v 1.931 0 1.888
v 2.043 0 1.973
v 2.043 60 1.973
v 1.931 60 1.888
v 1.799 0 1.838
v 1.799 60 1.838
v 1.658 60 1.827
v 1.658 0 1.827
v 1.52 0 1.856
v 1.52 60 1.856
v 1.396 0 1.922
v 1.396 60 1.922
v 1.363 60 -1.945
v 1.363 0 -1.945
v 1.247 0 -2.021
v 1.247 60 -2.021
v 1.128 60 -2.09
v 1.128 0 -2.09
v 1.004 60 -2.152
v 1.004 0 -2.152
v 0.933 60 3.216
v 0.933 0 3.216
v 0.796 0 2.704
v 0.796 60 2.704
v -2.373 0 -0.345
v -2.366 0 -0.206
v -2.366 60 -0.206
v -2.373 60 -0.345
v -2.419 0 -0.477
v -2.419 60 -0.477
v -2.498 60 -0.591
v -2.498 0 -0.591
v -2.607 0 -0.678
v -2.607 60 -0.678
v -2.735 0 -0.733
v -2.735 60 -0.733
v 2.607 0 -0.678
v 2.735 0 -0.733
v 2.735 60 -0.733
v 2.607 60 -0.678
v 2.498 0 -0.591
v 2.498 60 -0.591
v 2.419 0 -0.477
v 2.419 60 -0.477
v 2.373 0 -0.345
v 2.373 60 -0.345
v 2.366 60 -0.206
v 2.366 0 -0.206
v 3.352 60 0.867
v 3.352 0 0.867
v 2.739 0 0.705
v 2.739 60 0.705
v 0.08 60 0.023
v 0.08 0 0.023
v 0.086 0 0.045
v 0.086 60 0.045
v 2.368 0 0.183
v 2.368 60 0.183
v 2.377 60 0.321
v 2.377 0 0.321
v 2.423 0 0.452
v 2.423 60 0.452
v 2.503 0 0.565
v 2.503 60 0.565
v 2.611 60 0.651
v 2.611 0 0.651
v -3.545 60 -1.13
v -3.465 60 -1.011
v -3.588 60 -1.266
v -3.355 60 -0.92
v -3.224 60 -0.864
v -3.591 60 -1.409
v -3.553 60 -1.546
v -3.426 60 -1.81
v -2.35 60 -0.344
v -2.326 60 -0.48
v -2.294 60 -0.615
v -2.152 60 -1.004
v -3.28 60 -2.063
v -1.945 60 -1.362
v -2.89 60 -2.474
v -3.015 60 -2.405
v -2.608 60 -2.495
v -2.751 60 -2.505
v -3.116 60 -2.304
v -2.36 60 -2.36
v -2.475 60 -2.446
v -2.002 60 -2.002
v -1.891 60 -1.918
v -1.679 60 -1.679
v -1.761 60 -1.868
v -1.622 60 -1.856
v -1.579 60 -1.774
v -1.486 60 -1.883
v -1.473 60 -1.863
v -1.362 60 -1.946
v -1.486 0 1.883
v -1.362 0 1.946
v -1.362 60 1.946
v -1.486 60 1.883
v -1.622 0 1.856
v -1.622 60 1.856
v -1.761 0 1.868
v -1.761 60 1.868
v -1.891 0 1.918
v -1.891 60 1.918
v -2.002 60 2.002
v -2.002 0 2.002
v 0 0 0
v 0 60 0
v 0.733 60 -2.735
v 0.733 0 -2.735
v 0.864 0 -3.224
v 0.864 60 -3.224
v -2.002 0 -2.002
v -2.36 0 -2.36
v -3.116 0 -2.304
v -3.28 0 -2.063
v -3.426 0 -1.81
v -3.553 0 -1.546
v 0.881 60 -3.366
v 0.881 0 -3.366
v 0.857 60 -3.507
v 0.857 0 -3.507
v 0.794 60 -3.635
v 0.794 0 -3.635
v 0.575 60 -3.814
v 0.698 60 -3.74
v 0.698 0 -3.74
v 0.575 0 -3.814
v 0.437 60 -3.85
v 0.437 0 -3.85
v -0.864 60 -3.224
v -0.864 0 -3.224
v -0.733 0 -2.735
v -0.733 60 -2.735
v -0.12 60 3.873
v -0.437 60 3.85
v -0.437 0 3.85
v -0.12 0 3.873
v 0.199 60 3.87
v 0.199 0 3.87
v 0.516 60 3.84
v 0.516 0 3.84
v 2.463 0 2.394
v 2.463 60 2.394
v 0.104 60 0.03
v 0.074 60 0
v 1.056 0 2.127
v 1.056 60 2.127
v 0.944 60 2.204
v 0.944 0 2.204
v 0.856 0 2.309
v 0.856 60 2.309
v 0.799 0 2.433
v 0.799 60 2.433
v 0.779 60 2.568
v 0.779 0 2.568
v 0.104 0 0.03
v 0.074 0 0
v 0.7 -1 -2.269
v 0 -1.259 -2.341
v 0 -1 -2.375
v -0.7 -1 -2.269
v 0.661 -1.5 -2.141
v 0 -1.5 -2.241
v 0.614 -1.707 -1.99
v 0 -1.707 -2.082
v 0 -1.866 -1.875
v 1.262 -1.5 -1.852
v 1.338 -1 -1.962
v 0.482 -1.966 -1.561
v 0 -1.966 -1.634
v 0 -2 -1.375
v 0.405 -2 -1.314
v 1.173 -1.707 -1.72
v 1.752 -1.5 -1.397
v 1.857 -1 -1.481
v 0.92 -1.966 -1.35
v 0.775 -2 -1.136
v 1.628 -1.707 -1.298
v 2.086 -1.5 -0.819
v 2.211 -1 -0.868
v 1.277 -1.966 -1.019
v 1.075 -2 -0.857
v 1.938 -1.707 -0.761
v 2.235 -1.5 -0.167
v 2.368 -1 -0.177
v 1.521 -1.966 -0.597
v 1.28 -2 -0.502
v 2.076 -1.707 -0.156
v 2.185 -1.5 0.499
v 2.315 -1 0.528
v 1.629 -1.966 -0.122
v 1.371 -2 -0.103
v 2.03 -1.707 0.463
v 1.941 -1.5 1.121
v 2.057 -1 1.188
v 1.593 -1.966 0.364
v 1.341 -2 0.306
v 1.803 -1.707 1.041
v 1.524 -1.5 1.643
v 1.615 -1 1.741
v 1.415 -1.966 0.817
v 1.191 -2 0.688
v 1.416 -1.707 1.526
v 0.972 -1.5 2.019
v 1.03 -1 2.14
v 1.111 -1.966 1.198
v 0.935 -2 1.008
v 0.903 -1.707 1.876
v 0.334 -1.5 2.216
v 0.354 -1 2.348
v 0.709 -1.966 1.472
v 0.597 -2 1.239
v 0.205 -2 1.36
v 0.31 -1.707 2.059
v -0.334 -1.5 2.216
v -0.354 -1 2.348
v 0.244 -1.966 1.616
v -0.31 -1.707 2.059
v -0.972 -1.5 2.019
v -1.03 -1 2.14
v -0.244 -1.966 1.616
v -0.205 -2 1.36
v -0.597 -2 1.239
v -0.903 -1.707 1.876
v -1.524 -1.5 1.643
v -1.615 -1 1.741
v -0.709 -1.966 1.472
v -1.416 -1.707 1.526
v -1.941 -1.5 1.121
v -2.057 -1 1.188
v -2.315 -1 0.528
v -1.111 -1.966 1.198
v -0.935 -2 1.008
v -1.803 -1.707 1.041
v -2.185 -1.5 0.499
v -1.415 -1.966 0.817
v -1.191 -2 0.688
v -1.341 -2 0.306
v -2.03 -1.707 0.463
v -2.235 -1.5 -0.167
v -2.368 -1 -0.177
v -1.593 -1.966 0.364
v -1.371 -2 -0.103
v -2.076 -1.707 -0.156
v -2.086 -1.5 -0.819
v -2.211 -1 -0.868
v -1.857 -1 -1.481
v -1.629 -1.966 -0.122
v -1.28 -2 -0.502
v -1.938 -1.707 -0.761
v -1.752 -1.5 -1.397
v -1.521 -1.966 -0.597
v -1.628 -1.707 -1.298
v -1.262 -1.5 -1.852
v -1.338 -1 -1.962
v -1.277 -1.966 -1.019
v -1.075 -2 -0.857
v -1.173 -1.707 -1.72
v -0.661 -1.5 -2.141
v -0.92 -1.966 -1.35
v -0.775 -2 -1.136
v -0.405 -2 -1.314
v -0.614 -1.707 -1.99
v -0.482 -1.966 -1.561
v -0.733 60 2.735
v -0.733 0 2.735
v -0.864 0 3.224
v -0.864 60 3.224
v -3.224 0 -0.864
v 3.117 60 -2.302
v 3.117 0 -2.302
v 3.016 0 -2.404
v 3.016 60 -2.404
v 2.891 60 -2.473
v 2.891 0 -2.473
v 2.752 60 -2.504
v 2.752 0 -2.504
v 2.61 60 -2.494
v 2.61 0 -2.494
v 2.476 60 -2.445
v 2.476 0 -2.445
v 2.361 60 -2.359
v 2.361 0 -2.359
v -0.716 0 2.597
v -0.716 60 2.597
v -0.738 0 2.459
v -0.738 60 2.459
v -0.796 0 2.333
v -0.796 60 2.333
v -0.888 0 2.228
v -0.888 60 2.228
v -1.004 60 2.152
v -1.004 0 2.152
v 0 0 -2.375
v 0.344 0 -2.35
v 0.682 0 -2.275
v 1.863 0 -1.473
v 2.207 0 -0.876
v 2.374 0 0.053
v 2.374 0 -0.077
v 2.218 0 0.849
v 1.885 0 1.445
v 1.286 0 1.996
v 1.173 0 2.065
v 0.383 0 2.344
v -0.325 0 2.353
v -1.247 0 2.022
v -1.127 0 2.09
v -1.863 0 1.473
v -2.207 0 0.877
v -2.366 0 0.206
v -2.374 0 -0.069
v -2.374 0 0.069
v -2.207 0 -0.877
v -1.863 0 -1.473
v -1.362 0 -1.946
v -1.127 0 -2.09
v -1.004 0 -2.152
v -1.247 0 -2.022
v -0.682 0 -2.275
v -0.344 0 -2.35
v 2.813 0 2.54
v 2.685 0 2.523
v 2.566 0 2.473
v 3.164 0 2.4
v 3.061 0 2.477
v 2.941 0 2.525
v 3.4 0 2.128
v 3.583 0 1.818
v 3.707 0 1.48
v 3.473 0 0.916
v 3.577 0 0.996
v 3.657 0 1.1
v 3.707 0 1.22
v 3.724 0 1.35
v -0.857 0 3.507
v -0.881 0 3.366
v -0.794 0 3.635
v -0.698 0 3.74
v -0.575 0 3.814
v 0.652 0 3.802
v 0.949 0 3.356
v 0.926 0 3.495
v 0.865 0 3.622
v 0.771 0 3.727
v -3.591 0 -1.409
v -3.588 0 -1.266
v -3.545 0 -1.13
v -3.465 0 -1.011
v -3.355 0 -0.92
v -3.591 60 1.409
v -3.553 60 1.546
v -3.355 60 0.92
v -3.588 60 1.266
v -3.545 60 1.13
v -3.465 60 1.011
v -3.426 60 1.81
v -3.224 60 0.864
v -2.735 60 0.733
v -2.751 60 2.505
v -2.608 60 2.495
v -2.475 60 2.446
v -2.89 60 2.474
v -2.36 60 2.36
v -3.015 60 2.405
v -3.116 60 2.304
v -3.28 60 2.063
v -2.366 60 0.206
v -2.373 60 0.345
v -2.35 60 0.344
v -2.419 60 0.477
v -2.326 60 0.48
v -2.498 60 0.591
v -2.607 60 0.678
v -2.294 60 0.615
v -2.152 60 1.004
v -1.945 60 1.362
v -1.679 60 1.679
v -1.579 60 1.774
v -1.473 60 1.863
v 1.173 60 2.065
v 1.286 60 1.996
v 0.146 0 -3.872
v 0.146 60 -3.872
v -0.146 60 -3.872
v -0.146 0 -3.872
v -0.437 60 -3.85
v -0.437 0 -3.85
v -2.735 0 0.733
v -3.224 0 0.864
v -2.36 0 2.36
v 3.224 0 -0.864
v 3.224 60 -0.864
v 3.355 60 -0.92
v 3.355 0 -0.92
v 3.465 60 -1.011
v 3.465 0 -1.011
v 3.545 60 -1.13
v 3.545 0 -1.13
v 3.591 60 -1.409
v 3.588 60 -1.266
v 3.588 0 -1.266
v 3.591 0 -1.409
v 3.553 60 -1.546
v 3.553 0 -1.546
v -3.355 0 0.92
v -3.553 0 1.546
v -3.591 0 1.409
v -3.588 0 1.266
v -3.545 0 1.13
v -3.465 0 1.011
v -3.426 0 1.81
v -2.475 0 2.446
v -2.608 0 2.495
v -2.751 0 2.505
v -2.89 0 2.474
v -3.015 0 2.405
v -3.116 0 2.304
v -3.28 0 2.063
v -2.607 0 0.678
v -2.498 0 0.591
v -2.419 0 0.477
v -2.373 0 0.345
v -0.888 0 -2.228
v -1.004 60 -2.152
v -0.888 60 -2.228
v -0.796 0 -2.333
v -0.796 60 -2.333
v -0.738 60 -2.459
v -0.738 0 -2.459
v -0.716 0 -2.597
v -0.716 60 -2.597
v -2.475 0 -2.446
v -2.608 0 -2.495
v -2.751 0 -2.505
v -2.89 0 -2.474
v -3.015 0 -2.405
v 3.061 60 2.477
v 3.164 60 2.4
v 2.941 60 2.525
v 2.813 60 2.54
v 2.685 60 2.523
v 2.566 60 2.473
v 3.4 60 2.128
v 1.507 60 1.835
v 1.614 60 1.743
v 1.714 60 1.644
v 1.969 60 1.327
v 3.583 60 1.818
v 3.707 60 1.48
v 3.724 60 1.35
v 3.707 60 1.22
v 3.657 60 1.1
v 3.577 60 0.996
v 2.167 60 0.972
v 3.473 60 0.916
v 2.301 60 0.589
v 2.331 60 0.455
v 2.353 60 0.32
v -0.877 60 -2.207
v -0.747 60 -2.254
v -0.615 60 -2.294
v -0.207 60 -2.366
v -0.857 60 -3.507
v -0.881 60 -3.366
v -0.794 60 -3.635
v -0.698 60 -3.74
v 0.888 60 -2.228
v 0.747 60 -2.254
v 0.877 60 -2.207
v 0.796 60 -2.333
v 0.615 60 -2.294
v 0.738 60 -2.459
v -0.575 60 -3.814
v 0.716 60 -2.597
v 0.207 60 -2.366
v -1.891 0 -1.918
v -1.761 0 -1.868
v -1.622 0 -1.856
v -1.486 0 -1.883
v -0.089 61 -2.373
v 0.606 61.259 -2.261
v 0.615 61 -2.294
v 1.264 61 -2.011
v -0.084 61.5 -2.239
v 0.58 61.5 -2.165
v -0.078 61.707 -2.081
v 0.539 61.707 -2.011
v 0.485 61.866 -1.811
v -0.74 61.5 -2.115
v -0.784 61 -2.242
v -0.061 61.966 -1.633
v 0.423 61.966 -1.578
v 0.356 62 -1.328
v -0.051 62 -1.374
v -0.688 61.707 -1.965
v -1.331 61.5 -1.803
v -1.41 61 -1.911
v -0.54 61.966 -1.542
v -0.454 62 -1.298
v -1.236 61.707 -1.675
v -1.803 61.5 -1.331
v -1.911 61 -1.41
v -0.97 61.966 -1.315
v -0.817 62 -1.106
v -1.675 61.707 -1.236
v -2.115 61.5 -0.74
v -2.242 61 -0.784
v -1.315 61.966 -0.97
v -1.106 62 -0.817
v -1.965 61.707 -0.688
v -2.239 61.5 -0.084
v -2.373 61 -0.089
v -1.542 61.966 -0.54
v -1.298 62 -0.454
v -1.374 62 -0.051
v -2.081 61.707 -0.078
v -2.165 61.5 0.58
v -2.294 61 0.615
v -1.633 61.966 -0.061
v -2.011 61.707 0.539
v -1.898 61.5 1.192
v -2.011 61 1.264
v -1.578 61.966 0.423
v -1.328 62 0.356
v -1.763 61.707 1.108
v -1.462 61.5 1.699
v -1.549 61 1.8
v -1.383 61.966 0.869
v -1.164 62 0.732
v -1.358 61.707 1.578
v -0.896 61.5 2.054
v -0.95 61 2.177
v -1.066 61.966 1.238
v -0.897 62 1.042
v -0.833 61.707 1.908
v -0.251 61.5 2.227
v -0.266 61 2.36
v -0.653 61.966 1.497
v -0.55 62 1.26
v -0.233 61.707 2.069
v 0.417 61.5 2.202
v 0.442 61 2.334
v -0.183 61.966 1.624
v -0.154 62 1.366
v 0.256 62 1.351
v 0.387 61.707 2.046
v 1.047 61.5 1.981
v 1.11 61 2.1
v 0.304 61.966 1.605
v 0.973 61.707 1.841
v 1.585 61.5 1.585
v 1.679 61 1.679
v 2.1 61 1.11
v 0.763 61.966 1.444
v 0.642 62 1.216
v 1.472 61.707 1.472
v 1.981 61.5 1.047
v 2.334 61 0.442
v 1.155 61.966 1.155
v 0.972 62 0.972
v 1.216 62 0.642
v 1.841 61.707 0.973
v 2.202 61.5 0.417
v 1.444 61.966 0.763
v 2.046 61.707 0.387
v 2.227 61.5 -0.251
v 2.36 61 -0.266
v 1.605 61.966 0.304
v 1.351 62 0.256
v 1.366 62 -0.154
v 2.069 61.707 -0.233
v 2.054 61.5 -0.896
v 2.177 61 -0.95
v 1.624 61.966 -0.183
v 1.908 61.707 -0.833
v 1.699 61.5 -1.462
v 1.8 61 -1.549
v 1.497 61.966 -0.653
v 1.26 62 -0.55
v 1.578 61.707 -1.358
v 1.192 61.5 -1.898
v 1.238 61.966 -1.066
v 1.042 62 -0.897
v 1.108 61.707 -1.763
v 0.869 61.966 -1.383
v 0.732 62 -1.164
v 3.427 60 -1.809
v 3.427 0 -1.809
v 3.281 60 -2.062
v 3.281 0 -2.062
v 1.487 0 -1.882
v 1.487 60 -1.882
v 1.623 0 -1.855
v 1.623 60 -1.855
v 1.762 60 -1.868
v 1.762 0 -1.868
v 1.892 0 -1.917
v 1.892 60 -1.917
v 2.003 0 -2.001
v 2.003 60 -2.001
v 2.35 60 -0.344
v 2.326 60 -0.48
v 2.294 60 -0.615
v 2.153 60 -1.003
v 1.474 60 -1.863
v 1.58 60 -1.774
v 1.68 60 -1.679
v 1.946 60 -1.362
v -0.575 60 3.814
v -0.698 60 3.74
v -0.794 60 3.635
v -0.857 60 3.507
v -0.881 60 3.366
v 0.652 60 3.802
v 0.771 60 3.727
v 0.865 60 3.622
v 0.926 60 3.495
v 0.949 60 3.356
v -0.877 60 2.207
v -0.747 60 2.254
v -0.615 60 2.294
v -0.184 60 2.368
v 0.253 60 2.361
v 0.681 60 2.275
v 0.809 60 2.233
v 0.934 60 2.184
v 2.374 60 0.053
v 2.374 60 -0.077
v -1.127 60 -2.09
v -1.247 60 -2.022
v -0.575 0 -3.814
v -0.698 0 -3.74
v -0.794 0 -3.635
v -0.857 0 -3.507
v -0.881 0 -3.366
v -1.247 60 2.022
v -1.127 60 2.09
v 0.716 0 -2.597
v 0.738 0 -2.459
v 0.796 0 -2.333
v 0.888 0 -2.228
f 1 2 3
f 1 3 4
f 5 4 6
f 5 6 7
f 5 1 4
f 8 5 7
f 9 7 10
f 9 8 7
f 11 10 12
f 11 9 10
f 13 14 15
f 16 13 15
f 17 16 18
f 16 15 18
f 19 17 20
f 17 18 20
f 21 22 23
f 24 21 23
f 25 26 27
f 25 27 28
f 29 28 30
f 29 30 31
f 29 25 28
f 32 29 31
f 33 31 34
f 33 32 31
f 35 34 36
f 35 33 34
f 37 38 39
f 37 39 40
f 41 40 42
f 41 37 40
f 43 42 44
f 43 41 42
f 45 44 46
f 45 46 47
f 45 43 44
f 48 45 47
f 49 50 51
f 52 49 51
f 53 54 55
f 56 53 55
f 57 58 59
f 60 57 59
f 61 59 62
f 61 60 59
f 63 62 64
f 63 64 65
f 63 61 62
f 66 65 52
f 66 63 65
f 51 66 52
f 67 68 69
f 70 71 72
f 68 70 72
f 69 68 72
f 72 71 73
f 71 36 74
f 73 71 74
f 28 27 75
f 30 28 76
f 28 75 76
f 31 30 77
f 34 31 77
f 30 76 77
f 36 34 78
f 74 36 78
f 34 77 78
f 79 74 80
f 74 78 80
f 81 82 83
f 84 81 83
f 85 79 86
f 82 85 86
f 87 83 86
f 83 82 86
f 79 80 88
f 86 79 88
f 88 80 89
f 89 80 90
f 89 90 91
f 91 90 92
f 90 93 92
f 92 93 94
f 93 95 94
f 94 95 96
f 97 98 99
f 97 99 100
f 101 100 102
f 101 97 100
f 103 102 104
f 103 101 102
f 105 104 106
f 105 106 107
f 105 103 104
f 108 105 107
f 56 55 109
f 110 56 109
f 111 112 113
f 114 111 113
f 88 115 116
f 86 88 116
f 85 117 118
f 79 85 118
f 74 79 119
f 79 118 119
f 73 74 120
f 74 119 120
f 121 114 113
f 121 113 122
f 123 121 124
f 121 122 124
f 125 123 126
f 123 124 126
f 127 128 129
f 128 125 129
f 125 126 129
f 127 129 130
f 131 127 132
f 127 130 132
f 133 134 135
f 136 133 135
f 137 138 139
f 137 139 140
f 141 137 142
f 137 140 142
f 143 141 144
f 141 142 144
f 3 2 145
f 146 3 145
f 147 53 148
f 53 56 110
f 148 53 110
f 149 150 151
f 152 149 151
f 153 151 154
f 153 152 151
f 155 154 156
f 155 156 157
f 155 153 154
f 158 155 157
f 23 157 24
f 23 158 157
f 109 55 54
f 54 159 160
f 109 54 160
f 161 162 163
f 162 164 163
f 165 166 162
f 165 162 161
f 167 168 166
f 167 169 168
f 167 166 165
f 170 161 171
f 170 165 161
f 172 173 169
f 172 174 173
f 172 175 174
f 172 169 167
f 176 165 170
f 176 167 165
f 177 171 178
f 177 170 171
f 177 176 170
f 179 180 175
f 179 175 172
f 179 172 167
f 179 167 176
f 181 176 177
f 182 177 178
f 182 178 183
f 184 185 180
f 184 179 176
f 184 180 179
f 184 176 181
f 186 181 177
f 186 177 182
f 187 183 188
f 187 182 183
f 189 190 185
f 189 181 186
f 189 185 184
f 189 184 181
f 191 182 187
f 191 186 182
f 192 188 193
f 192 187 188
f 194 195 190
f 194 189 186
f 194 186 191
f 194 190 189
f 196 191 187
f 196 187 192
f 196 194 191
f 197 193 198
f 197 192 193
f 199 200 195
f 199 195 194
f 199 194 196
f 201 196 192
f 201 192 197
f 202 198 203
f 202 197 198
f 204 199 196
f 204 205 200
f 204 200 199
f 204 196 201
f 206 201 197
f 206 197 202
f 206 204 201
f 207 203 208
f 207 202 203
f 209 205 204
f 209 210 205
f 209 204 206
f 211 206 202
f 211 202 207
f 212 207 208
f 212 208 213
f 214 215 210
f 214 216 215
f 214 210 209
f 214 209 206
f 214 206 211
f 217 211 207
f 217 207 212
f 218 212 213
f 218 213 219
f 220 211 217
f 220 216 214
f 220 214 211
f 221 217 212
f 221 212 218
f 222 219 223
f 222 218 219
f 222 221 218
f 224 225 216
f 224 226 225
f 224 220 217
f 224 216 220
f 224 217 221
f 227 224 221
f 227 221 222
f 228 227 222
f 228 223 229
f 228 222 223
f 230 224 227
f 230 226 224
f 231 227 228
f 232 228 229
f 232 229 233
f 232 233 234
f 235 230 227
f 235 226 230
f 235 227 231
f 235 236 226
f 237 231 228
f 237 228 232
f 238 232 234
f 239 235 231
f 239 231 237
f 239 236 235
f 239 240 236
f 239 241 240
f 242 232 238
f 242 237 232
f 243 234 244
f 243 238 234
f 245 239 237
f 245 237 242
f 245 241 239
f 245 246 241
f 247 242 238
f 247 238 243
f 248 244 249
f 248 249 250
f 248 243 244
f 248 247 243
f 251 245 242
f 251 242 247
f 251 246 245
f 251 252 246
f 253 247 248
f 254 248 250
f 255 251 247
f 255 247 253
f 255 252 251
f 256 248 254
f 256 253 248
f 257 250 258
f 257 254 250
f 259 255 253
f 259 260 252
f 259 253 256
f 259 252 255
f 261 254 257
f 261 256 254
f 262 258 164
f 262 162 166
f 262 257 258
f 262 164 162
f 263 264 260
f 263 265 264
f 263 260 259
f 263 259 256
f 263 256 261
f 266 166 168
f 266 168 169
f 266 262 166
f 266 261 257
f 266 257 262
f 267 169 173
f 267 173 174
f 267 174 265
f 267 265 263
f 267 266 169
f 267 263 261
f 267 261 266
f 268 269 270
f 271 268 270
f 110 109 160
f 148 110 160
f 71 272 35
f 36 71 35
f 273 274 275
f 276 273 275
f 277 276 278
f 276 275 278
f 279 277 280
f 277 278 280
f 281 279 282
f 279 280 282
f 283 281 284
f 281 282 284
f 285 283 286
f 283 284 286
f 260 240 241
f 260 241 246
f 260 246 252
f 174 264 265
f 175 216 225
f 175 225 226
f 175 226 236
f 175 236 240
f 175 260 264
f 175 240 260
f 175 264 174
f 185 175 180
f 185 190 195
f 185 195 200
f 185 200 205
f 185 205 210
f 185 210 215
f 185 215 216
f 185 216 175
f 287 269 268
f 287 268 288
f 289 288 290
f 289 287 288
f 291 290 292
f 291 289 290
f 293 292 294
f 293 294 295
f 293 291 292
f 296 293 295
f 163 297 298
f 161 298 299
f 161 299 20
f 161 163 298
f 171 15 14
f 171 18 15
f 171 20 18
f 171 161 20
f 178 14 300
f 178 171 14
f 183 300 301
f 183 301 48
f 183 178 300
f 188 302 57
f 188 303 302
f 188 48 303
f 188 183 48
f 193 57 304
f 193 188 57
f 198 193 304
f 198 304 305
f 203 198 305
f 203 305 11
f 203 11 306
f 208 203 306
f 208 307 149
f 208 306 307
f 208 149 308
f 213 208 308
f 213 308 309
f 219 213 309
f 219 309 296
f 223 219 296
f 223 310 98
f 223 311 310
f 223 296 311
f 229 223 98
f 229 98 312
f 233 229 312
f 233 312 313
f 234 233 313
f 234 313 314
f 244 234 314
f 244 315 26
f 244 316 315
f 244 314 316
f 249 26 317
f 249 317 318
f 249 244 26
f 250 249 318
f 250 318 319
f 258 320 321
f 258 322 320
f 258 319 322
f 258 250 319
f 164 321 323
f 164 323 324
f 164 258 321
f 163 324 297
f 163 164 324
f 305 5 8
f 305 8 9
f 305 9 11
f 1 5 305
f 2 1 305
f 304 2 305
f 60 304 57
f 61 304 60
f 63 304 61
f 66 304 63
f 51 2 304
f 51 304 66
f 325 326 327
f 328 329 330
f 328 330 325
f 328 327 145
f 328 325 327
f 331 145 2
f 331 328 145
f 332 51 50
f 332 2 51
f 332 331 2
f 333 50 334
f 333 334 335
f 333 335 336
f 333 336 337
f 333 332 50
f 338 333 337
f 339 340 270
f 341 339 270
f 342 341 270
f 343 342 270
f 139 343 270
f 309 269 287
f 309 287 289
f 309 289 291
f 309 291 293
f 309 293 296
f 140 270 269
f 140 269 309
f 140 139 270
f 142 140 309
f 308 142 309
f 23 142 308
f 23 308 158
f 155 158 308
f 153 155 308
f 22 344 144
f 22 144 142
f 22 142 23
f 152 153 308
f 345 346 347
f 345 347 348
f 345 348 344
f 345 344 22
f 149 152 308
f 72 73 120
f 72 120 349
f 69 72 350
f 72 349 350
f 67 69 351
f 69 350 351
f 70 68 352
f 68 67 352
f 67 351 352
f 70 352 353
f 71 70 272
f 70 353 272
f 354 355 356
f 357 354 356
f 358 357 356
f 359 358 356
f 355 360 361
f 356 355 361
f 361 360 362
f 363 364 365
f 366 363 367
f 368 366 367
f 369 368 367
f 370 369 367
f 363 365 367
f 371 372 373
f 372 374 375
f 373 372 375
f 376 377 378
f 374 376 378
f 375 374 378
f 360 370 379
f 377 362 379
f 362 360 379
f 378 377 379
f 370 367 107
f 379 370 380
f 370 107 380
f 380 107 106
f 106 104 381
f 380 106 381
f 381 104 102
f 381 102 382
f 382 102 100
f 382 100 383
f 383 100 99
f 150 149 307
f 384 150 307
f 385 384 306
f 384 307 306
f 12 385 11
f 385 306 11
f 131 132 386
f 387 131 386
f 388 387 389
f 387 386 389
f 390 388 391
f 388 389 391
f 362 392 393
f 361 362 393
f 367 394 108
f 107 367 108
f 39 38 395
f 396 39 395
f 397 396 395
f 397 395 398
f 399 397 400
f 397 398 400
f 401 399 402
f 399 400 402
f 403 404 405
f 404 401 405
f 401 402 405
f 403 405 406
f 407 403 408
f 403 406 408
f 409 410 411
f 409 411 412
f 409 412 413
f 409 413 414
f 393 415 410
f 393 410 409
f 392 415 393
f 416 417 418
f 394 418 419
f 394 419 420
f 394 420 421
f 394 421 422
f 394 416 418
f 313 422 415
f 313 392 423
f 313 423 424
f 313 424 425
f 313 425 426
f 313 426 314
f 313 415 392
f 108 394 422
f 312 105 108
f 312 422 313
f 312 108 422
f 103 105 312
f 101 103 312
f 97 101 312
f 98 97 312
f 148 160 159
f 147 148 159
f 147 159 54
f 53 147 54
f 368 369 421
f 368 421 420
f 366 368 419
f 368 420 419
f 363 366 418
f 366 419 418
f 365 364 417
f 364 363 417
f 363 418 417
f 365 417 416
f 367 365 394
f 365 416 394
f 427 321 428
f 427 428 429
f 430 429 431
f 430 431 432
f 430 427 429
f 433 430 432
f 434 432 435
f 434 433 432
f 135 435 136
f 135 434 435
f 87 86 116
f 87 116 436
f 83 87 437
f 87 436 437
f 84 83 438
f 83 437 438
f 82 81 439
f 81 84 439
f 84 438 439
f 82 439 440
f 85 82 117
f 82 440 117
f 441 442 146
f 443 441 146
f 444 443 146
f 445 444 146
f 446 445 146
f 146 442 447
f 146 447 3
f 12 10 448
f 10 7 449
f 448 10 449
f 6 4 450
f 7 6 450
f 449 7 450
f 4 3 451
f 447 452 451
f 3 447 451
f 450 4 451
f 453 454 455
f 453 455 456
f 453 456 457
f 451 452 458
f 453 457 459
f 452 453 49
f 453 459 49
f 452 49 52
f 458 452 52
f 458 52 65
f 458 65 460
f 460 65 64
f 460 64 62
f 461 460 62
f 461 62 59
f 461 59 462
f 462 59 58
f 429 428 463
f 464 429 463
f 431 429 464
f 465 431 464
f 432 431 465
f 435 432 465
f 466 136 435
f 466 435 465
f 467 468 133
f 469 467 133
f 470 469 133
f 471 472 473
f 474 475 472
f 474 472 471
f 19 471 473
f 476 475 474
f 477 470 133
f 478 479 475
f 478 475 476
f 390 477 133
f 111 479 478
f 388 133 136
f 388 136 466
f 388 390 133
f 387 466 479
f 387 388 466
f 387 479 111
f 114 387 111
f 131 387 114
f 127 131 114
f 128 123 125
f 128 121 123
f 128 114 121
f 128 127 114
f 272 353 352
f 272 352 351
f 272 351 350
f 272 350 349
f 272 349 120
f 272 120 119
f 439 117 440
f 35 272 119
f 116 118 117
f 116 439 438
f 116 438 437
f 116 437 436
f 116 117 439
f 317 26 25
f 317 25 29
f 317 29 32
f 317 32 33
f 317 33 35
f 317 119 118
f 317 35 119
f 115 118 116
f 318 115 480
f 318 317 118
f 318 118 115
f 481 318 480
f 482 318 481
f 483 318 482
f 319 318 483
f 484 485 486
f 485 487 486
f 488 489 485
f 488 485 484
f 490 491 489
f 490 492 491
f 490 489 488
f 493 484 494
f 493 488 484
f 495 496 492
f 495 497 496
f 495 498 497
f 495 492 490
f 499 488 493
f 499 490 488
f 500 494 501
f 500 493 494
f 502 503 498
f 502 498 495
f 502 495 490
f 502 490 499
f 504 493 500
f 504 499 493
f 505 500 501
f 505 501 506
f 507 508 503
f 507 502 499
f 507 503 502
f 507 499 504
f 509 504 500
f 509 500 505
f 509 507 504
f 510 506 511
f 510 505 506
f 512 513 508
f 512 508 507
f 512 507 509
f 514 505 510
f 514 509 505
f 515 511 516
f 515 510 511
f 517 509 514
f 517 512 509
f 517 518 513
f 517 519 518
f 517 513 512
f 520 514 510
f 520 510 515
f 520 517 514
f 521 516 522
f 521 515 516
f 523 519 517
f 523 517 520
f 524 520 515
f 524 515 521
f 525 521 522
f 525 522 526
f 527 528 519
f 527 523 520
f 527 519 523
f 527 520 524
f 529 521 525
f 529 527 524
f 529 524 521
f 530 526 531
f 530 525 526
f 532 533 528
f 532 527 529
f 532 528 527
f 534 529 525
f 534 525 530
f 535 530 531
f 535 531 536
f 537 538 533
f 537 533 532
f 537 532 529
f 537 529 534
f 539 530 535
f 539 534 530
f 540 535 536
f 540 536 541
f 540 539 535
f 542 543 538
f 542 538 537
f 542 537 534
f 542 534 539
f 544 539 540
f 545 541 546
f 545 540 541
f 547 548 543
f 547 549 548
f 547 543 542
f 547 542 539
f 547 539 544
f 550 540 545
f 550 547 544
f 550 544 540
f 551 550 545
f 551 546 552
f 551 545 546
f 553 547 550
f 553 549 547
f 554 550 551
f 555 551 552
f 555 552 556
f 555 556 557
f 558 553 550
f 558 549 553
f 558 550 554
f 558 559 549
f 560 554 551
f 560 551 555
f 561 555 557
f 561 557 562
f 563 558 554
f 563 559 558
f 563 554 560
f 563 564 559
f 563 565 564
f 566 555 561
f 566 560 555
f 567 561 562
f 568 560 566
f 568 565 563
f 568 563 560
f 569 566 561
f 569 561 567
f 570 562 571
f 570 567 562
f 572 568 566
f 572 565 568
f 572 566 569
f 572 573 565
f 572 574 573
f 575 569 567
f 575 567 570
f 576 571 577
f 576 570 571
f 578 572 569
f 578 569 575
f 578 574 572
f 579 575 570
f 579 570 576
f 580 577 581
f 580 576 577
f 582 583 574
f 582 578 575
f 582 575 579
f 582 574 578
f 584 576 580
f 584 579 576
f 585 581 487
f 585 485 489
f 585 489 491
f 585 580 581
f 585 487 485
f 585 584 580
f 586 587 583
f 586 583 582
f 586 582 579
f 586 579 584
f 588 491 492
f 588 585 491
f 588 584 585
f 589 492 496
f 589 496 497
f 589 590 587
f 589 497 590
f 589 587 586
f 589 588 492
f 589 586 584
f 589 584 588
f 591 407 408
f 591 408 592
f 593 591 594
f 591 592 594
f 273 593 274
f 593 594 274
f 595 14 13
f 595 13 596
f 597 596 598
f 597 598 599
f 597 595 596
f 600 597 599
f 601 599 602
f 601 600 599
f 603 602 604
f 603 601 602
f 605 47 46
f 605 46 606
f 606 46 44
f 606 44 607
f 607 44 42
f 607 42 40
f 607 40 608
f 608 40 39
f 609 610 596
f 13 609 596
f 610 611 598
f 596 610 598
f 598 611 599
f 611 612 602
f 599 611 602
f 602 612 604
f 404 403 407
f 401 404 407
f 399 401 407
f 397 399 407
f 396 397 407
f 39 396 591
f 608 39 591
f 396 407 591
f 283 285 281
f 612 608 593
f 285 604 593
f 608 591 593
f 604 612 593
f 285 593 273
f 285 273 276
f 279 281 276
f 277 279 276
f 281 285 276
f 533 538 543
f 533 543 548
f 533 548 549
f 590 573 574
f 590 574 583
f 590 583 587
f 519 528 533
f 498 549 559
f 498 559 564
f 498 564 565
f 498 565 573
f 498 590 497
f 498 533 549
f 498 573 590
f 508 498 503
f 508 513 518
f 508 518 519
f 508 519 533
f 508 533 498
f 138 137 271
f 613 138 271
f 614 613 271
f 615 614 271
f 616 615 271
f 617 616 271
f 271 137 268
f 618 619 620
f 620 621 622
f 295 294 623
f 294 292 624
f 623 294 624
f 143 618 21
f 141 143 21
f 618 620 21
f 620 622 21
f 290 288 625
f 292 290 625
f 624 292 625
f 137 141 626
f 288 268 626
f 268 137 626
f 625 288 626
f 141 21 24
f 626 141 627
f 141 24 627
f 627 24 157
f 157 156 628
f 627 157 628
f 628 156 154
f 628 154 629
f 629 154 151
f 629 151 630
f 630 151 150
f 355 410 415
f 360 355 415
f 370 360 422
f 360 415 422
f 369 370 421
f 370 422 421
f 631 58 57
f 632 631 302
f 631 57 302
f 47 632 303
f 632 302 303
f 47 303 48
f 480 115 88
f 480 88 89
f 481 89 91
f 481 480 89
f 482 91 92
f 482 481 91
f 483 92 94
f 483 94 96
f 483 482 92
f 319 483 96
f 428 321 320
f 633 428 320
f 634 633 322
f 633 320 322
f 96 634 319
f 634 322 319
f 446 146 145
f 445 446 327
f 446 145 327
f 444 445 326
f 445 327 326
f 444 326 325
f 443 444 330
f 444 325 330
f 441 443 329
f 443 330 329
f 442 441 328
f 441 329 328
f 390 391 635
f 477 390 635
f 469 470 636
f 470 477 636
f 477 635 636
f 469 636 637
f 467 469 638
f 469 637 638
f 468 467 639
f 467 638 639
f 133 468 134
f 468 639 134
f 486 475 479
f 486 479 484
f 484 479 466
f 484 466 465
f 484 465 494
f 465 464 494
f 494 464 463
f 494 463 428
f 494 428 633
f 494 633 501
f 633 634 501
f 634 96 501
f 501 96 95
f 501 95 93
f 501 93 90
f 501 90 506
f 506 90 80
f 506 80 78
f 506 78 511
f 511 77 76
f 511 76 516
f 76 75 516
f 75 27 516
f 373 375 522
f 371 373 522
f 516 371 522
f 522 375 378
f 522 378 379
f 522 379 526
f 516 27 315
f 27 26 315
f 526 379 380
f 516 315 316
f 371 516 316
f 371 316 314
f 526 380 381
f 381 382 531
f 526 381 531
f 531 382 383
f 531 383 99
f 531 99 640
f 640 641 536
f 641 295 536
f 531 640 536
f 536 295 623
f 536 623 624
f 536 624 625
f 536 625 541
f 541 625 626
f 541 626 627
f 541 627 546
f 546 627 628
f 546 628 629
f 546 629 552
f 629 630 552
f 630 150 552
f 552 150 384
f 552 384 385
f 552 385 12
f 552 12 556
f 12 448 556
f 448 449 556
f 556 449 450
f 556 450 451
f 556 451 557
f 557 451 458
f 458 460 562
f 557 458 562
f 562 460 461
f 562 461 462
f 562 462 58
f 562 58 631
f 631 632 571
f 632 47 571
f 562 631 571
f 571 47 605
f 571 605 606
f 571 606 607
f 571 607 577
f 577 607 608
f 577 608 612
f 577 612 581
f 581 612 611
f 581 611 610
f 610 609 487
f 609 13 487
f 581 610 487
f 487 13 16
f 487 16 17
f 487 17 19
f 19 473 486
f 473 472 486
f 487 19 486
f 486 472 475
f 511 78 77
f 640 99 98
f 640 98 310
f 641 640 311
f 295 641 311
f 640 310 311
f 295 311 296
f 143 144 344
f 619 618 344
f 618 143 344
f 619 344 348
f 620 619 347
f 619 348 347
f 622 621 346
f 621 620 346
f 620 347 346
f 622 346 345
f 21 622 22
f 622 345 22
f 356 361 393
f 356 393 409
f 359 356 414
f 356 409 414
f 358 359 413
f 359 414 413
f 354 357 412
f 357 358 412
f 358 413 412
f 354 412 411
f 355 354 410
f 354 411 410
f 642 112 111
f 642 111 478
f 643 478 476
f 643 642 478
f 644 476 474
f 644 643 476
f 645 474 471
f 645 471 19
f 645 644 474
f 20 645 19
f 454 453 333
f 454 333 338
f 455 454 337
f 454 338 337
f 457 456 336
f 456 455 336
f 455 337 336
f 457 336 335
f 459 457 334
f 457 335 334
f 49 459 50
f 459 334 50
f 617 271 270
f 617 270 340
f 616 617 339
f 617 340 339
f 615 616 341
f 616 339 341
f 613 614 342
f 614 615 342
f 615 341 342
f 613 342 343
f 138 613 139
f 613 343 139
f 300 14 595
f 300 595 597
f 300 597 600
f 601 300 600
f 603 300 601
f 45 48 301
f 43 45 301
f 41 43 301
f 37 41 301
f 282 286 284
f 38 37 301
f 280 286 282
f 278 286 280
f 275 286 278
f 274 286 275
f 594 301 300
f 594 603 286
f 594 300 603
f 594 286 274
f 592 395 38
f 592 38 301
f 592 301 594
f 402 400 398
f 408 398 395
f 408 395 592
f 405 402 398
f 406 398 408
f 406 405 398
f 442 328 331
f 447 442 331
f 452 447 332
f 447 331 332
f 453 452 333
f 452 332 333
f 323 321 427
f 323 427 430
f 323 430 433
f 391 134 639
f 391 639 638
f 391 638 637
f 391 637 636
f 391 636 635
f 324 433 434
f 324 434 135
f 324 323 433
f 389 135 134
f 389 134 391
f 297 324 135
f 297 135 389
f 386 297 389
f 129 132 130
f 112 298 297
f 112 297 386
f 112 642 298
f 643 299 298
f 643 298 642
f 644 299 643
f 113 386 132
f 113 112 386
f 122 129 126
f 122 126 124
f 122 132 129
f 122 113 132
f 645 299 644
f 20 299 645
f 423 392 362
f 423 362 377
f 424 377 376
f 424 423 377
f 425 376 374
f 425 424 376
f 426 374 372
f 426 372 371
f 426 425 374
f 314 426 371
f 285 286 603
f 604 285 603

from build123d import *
from build123d.topology import SkipClean

# Parameters (mm, degrees)
BOSS_EXTRUDE1_DEPTH = 60
SKETCH4_R           = 2.375
BOSS_EXTRUDE3_DEPTH = 2
FILLET1_R           = 0.5
BOSS_EXTRUDE5_START = 2
SKETCH6_R           = 2.375
BOSS_EXTRUDE5_DEPTH = 2
FILLET2_R           = 1


with BuildPart() as part:
    # Sketch2 → Boss-Extrude1 (new body)
    with BuildSketch(Plane(origin=(0, 0, 0), x_dir=(1, 0, 0), z_dir=(0, 1, 0))):
        with BuildLine():
            Line((3.775215965, -0.978645895), (2.300774305, -0.58912019))
            ThreePointArc((2.300774305, -0.58912019), (2.374963211, 0.013219106), (2.294073837, 0.614695232))
            Line((2.294073837, 0.614695232), (3.742962577, 1.0029238))
            ThreePointArc((3.742962577, 1.0029238), (3.356294138, 1.936727823), (2.741299364, 2.73877761))
            Line((2.741299364, 2.73877761), (1.680151223, 1.678605632))
            ThreePointArc((1.680151223, 1.678605632), (1.187973207, 2.056537055), (0.614695232, 2.294073837))
            Line((0.614695232, 2.294073837), (1.0029238, 3.742962577))
            ThreePointArc((1.0029238, 3.742962577), (0, 3.875), (-1.0029238, 3.742962577))
            Line((-1.0029238, 3.742962577), (-0.614695232, 2.294073837))
            ThreePointArc((-0.614695232, 2.294073837), (-1.1875, 2.056810334), (-1.679378605, 1.679378605))
            Line((-1.679378605, 1.679378605), (-2.740038777, 2.740038777))
            ThreePointArc((-2.740038777, 2.740038777), (-3.35584844, 1.9375), (-3.742962577, 1.0029238))
            Line((-3.742962577, 1.0029238), (-2.294073837, 0.614695232))
            ThreePointArc((-2.294073837, 0.614695232), (-2.375, 0), (-2.294073837, -0.614695232))
            Line((-2.294073837, -0.614695232), (-3.742962577, -1.0029238))
            ThreePointArc((-3.742962577, -1.0029238), (-3.35584844, -1.9375), (-2.740038777, -2.740038777))
            Line((-2.740038777, -2.740038777), (-1.679378605, -1.679378605))
            ThreePointArc((-1.679378605, -1.679378605), (-1.1875, -2.056810334), (-0.614695232, -2.294073837))
            Line((-0.614695232, -2.294073837), (-1.0029238, -3.742962577))
            ThreePointArc((-1.0029238, -3.742962577), (0.033967076, -3.874851125), (1.068386506, -3.724805401))
            Line((1.068386506, -3.724805401), (0.681359786, -2.275164575))
            ThreePointArc((0.681359786, -2.275164575), (1.238849907, -2.026296106), (1.714477211, -1.643530618))
            Line((1.714477211, -1.643530618), (2.767163136, -2.698133353))
            ThreePointArc((2.767163136, -2.698133353), (3.500652231, -1.972912562), (3.775215965, -0.978645895))
        make_face()
        Polygon((0.085836926, -0.044584082), (0, 0), (0.073933818, 0), (0.104207494, -0.030328801), (0.080162685, -0.023330742), align=None, mode=Mode.SUBTRACT)
    extrude(amount=BOSS_EXTRUDE1_DEPTH)

    # Sketch4 → Boss-Extrude3 (add)
    with BuildSketch(Plane(origin=(0, 60, 0), x_dir=(1, 0, 0), z_dir=(0, 1, 0))):
        with Locations(Location((0, 0, 0), (0, 0, 75))):
            Circle(SKETCH4_R)
    extrude(amount=BOSS_EXTRUDE3_DEPTH)

    # Fillet1
    # the kernel refuses this fillet: 0.5 mm, written as the material it adds along each edge
    with BuildSketch(Plane(origin=(-2.294073837, 0, 0.614695232), x_dir=(-0.1735157400494046, 0, -0.9848310961556339), z_dir=(0, 1, 0)), Plane(origin=(-1.679378605, 0, -1.679378605), x_dir=(0.7661308776829403, 0, -0.6426845869170722), z_dir=(0, 1, 0)), Plane(origin=(0.614695232, 0, -2.294073837), x_dir=(0.939646617732385, 0, 0.3421465092384974), z_dir=(0, 1, 0)), Plane(origin=(2.294073837, 0, -0.614695232), x_dir=(0.1735157400495284, 0, 0.9848310961556122), z_dir=(0, 1, 0)), Plane(origin=(-0.614695232, 0, 2.294073837), x_dir=(-0.9396466177323688, 0, -0.3421465092385419), z_dir=(0, 1, 0))) as fillet1_piece_1:
        with BuildLine():
            CenterArc((0.458270974, 0.498091484), FILLET1_R, 185.007705084, 79.984589832)
            Line((-0.03982051, 0.45444663), (0, 0))
            ThreePointArc((0, 0), (0.20731306, 0.00906545), (0.414626119, 0))
        make_face()
    extrude(amount=60)
    with BuildSketch(Plane(origin=(-2.294073837, 0, -0.614695232), x_dir=(-0.17351574004940104, 0, 0.9848310961556345), z_dir=(0, 1, 0)), Plane(origin=(-0.614695232, 0, -2.294073837), x_dir=(-0.9396466177323672, 0, 0.3421465092385461), z_dir=(0, 1, 0)), Plane(origin=(1.680151223, 0, -1.678605632), x_dir=(-0.7658350540129166, 0, -0.643037067395833), z_dir=(0, 1, 0))) as fillet1_piece_2:
        with BuildLine():
            CenterArc((0.458270974, -0.498091484), FILLET1_R, 95.007705084, 79.984589832)
            Line((-0.03982051, -0.45444663), (0, 0))
            ThreePointArc((0, 0), (0.20731306, -0.00906545), (0.414626119, 0))
        make_face()
    extrude(amount=60)
    with BuildSketch(Plane(origin=(2.300774305, 0, 0.58912019), x_dir=(0.9668296370387235, 0, 0.2554221073900419), z_dir=(0, 1, 0))) as fillet1_piece_3:
        with BuildLine():
            CenterArc((0.453002414, 0.5), FILLET1_R, 190.38170854, 79.61829146)
            ThreePointArc((-0.038812111, 0.409897433), (-0.010506812, 0.205791362), (0, 0))
            Line((0, 0), (0.453002414, 0))
        make_face()
    extrude(amount=60)
    with BuildSketch(Plane(origin=(1.714477211, 0, 1.643530618), x_dir=(0.7064632978713469, 0, 0.7077496794494086), z_dir=(0, 1, 0))) as fillet1_piece_4:
        with BuildLine():
            CenterArc((0.465508471, -0.5), FILLET1_R, 90, 81.041880237)
            ThreePointArc((-0.02839274, -0.422143763), (-0.00477723, -0.211705398), (0, 0))
            Line((0, 0), (0.465508471, 0))
        make_face()
    extrude(amount=60)
    with BuildSketch(Plane(origin=(0.681359786, 0, 2.275164575), x_dir=(0.25794627414893684, 0, 0.966159262053975), z_dir=(0, 1, 0))) as fillet1_piece_5:
        with BuildLine():
            CenterArc((0.443713653, 0.5), FILLET1_R, 191.464392376, 78.535607624)
            ThreePointArc((-0.046310555, 0.400620549), (-0.014636445, 0.201295026), (0, 0))
            Line((0, 0), (0.443713653, 0))
        make_face()
    extrude(amount=60)
    with BuildSketch(Plane(origin=(-1.679378605, 0, 1.679378605), x_dir=(-0.7071067811865471, 0, 0.707106781186548), z_dir=(0, 1, 0))) as fillet1_piece_6:
        with BuildLine():
            CenterArc((0.456187913, 0.5), FILLET1_R, 190.015410168, 79.984589832)
            ThreePointArc((-0.036192593, 0.413043478), (-0.00906545, 0.20731306), (0, 0))
            Line((0, 0), (0.456187913, 0))
        make_face()
    extrude(amount=60)
    # the kernel refuses this fillet: 0.5 mm, written as the material it takes off along each edge
    with BuildSketch(Plane(origin=(-2.740038777, -1.439160897, 2.740038777), x_dir=(-0.6526300069150477, 0, -0.7576767609436524), z_dir=(0, 1, 0)), Plane(origin=(-3.742962577, -1.439160897, -1.0029238), x_dir=(0.3298523193767966, 0, -0.9440325457322686), z_dir=(0, 1, 0)), Plane(origin=(2.741299364, -1.439160897, -2.73877761), x_dir=(0.652281279601926, 0, 0.7579769998363237), z_dir=(0, 1, 0))) as fillet1_2_piece_1:
        with BuildLine():
            CenterArc((0.538524723, -0.49861874), FILLET1_R, 85.740187873, 98.519624254)
            Line((0.039905983, -0.535758376), (0, 0))
            ThreePointArc((0, 0), (0.287832179, 0.010704768), (0.575664359, 0))
        make_face()
    extrude(amount=62.878321794, mode=Mode.SUBTRACT)
    with BuildSketch(Plane(origin=(-3.742962577, -1.439160897, 1.0029238), x_dir=(0.9659258262890679, 0, -0.2588190451025218), z_dir=(0, 1, 0)), Plane(origin=(-2.740038777, -1.439160897, -2.740038777), x_dir=(0.7071067811865476, 0, 0.7071067811865476), z_dir=(0, 1, 0)), Plane(origin=(3.742962577, -1.439160897, -1.0029238), x_dir=(-0.9659258262890681, 0, 0.25881904510252185), z_dir=(0, 1, 0)), Plane(origin=(-1.0029238, -1.439160897, 3.742962577), x_dir=(0.2588190451025216, 0, -0.9659258262890681), z_dir=(0, 1, 0))) as fillet1_2_piece_2:
        with BuildLine():
            CenterArc((0.537242519, -0.5), FILLET1_R, 90, 98.519624254)
            ThreePointArc((0.04275993, -0.574074074), (0.010704768, -0.287832179), (0, 0))
            Line((0, 0), (0.537242519, 0))
        make_face()
    extrude(amount=62.878321794, mode=Mode.SUBTRACT)
    with BuildSketch(Plane(origin=(-1.0029238, -1.439160897, -3.742962577), x_dir=(0.25881904510252174, 0, 0.965925826289068), z_dir=(0, 1, 0))) as fillet1_2_piece_3:
        with BuildLine():
            CenterArc((0.537242519, 0.5), FILLET1_R, 171.480375746, 98.519624254)
            ThreePointArc((0.04275993, 0.574074074), (0.010704768, 0.287832179), (0, 0))
            Line((0, 0), (0.537242519, 0))
        make_face()
    extrude(amount=62.878321794, mode=Mode.SUBTRACT)
    with BuildSketch(Plane(origin=(1.0029238, -1.439160897, -3.742962577), x_dir=(-0.9824823262918377, 0, -0.1863557847886099), z_dir=(0, 1, 0))) as fillet1_2_piece_4:
        with BuildLine():
            CenterArc((0.538524723, 0.49861874), FILLET1_R, 175.740187873, 98.519624254)
            Line((0.039905983, 0.535758376), (0, 0))
            ThreePointArc((0, 0), (0.287832179, -0.010704768), (0.575664359, 0))
        make_face()
    extrude(amount=62.878321794, mode=Mode.SUBTRACT)
    with BuildSketch(Plane(origin=(3.775215965, -1.264396568, 0.978645895), x_dir=(-0.9668296370387236, 0, -0.25542210739004173), z_dir=(0, 1, 0))) as fillet1_2_piece_5:
        with BuildLine():
            CenterArc((0.437999819, 0.5), FILLET1_R, 179.77718135, 90.22281865)
            ThreePointArc((-0.0619964, 0.501944455), (-0.046928547, 0.249004631), (0, 0))
            Line((0, 0), (0.437999819, 0))
        make_face()
    extrude(amount=62.528793137, mode=Mode.SUBTRACT)
    with BuildSketch(Plane(origin=(2.767163136, -1.241563867, 2.698133353), x_dir=(0.8000663385432955, 0, -0.5999115384203949), z_dir=(0, 1, 0))) as fillet1_2_piece_6:
        with BuildLine():
            CenterArc((0.434547354, 0.496131331), FILLET1_R, 188.084320914, 89.047719887)
            Line((-0.060483736, 0.425816179), (0, 0))
            ThreePointArc((0, 0), (0.248312773, -0.015474675), (0.496625547, 0))
        make_face()
    extrude(amount=62.483127735, mode=Mode.SUBTRACT)
    with BuildSketch(Plane(origin=(1.068386506, -1.410819518, 3.724805401), x_dir=(-0.9787647804449897, 0, 0.20498659605074468), z_dir=(0, 1, 0))) as fillet1_2_piece_7:
        with BuildLine():
            CenterArc((0.527919562, -0.498672678), FILLET1_R, 85.824226653, 97.295295094)
            Line((0.028660468, -0.525882193), (0, 0))
            ThreePointArc((0, 0), (0.282163904, 0.010286747), (0.564327807, 0))
        make_face()
    extrude(amount=62.821639036, mode=Mode.SUBTRACT)

    # Sketch6 → Boss-Extrude5 (add)
    with SkipClean():  # the faces are left unmerged after this step: merging them gives an invalid solid
        with BuildSketch(Plane.XZ.offset(BOSS_EXTRUDE5_START)):
            with Locations(Location((0, 0, 0), (0, 0, 270))):
                Circle(SKETCH6_R)
        extrude(amount=-BOSS_EXTRUDE5_DEPTH)

    # Fillet2
    fillet2_edges = [part.edges().sort_by_distance(p)[0] for p in [
        (-0.614695232, 62, 2.294073837),
        (0, -2, 2.375),
    ]]
    fillet(fillet2_edges, radius=FILLET2_R)


solid = part.part
